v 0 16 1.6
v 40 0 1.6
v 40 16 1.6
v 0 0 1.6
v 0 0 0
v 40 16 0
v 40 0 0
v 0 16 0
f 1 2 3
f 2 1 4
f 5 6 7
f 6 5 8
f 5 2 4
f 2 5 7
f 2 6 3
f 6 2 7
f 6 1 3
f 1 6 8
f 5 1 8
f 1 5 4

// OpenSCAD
$fn = 64;

pcb_length = 40.0;
pcb_width  = 16.0;
pcb_thick  = 1.6;

color([0.05, 0.45, 0.18])
cube([pcb_length, pcb_width, pcb_thick], center=false);
